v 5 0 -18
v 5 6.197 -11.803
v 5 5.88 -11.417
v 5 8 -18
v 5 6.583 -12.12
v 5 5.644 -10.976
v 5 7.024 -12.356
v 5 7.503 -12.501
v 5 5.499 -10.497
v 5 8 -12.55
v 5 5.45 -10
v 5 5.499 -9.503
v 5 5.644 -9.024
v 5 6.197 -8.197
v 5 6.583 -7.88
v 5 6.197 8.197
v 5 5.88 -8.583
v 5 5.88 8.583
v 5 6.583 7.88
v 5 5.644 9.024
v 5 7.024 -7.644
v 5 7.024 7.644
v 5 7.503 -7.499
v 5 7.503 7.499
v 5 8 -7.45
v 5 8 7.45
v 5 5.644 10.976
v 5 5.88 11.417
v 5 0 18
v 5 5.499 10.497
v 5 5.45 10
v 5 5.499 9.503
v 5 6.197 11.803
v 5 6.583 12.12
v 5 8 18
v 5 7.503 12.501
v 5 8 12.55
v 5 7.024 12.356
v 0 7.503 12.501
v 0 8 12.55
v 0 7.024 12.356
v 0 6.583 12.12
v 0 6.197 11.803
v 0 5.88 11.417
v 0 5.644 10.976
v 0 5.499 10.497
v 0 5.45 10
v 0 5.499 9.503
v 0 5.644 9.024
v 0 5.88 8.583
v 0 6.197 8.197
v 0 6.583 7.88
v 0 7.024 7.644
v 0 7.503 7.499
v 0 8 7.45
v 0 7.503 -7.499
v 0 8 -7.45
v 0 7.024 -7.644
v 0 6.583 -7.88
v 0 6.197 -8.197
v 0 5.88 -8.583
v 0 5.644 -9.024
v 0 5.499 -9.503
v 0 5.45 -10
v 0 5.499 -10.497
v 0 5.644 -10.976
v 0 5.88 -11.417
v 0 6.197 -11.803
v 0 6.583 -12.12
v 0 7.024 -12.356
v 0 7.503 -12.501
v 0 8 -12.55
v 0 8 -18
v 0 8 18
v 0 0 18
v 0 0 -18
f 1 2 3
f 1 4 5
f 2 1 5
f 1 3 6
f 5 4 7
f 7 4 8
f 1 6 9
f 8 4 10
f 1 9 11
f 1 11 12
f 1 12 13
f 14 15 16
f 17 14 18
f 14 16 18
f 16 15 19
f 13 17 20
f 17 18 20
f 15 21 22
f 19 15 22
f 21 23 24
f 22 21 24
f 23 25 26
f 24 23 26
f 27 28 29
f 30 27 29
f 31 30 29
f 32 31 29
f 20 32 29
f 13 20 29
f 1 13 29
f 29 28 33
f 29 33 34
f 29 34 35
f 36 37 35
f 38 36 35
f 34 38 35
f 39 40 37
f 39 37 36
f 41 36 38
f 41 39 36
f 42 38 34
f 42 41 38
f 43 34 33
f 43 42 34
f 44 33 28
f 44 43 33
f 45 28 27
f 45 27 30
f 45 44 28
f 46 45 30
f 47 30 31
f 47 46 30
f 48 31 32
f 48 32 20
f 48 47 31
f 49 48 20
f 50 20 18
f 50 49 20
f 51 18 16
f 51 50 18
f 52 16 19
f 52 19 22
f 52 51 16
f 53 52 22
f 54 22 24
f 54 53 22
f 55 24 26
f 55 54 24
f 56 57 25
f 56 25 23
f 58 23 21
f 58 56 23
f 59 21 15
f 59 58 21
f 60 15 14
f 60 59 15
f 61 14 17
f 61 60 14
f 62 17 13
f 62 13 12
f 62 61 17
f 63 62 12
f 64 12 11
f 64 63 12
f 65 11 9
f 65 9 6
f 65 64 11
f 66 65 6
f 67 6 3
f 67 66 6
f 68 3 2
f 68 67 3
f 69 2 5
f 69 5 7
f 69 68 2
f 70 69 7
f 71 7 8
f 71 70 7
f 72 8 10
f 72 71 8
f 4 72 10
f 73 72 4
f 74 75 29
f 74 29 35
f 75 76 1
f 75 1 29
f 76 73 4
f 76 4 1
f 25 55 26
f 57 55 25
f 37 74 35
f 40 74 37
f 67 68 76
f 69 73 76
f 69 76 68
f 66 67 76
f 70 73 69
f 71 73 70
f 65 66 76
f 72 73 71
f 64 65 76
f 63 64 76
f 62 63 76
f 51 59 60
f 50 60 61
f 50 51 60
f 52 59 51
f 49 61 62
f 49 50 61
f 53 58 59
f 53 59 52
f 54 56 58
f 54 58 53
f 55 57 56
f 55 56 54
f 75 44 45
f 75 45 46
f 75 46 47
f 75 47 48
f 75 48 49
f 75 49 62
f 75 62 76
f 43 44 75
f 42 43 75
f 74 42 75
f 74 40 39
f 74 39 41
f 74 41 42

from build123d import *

# Parameters (mm, degrees)
EXTRUDE_1_DEPTH = 5


with BuildPart() as part:
    # 草图2 → 凸台-拉伸1 (new body)
    with BuildSketch(Plane(origin=(0, 0, 0), x_dir=(0, 0, -1), z_dir=(1, 0, 0))):
        with BuildLine():
            Line((-7.45, 8), (7.45, 8))
            ThreePointArc((7.45, 8), (10, 5.45), (12.55, 8))
            Line((12.55, 8), (18, 8))
            Line((18, 8), (18, 0))
            Line((18, 0), (-18, 0))
            Line((-18, 0), (-18, 8))
            Line((-18, 8), (-12.55, 8))
            ThreePointArc((-12.55, 8), (-10, 5.45), (-7.45, 8))
        make_face()
    extrude(amount=EXTRUDE_1_DEPTH)


solid = part.part
